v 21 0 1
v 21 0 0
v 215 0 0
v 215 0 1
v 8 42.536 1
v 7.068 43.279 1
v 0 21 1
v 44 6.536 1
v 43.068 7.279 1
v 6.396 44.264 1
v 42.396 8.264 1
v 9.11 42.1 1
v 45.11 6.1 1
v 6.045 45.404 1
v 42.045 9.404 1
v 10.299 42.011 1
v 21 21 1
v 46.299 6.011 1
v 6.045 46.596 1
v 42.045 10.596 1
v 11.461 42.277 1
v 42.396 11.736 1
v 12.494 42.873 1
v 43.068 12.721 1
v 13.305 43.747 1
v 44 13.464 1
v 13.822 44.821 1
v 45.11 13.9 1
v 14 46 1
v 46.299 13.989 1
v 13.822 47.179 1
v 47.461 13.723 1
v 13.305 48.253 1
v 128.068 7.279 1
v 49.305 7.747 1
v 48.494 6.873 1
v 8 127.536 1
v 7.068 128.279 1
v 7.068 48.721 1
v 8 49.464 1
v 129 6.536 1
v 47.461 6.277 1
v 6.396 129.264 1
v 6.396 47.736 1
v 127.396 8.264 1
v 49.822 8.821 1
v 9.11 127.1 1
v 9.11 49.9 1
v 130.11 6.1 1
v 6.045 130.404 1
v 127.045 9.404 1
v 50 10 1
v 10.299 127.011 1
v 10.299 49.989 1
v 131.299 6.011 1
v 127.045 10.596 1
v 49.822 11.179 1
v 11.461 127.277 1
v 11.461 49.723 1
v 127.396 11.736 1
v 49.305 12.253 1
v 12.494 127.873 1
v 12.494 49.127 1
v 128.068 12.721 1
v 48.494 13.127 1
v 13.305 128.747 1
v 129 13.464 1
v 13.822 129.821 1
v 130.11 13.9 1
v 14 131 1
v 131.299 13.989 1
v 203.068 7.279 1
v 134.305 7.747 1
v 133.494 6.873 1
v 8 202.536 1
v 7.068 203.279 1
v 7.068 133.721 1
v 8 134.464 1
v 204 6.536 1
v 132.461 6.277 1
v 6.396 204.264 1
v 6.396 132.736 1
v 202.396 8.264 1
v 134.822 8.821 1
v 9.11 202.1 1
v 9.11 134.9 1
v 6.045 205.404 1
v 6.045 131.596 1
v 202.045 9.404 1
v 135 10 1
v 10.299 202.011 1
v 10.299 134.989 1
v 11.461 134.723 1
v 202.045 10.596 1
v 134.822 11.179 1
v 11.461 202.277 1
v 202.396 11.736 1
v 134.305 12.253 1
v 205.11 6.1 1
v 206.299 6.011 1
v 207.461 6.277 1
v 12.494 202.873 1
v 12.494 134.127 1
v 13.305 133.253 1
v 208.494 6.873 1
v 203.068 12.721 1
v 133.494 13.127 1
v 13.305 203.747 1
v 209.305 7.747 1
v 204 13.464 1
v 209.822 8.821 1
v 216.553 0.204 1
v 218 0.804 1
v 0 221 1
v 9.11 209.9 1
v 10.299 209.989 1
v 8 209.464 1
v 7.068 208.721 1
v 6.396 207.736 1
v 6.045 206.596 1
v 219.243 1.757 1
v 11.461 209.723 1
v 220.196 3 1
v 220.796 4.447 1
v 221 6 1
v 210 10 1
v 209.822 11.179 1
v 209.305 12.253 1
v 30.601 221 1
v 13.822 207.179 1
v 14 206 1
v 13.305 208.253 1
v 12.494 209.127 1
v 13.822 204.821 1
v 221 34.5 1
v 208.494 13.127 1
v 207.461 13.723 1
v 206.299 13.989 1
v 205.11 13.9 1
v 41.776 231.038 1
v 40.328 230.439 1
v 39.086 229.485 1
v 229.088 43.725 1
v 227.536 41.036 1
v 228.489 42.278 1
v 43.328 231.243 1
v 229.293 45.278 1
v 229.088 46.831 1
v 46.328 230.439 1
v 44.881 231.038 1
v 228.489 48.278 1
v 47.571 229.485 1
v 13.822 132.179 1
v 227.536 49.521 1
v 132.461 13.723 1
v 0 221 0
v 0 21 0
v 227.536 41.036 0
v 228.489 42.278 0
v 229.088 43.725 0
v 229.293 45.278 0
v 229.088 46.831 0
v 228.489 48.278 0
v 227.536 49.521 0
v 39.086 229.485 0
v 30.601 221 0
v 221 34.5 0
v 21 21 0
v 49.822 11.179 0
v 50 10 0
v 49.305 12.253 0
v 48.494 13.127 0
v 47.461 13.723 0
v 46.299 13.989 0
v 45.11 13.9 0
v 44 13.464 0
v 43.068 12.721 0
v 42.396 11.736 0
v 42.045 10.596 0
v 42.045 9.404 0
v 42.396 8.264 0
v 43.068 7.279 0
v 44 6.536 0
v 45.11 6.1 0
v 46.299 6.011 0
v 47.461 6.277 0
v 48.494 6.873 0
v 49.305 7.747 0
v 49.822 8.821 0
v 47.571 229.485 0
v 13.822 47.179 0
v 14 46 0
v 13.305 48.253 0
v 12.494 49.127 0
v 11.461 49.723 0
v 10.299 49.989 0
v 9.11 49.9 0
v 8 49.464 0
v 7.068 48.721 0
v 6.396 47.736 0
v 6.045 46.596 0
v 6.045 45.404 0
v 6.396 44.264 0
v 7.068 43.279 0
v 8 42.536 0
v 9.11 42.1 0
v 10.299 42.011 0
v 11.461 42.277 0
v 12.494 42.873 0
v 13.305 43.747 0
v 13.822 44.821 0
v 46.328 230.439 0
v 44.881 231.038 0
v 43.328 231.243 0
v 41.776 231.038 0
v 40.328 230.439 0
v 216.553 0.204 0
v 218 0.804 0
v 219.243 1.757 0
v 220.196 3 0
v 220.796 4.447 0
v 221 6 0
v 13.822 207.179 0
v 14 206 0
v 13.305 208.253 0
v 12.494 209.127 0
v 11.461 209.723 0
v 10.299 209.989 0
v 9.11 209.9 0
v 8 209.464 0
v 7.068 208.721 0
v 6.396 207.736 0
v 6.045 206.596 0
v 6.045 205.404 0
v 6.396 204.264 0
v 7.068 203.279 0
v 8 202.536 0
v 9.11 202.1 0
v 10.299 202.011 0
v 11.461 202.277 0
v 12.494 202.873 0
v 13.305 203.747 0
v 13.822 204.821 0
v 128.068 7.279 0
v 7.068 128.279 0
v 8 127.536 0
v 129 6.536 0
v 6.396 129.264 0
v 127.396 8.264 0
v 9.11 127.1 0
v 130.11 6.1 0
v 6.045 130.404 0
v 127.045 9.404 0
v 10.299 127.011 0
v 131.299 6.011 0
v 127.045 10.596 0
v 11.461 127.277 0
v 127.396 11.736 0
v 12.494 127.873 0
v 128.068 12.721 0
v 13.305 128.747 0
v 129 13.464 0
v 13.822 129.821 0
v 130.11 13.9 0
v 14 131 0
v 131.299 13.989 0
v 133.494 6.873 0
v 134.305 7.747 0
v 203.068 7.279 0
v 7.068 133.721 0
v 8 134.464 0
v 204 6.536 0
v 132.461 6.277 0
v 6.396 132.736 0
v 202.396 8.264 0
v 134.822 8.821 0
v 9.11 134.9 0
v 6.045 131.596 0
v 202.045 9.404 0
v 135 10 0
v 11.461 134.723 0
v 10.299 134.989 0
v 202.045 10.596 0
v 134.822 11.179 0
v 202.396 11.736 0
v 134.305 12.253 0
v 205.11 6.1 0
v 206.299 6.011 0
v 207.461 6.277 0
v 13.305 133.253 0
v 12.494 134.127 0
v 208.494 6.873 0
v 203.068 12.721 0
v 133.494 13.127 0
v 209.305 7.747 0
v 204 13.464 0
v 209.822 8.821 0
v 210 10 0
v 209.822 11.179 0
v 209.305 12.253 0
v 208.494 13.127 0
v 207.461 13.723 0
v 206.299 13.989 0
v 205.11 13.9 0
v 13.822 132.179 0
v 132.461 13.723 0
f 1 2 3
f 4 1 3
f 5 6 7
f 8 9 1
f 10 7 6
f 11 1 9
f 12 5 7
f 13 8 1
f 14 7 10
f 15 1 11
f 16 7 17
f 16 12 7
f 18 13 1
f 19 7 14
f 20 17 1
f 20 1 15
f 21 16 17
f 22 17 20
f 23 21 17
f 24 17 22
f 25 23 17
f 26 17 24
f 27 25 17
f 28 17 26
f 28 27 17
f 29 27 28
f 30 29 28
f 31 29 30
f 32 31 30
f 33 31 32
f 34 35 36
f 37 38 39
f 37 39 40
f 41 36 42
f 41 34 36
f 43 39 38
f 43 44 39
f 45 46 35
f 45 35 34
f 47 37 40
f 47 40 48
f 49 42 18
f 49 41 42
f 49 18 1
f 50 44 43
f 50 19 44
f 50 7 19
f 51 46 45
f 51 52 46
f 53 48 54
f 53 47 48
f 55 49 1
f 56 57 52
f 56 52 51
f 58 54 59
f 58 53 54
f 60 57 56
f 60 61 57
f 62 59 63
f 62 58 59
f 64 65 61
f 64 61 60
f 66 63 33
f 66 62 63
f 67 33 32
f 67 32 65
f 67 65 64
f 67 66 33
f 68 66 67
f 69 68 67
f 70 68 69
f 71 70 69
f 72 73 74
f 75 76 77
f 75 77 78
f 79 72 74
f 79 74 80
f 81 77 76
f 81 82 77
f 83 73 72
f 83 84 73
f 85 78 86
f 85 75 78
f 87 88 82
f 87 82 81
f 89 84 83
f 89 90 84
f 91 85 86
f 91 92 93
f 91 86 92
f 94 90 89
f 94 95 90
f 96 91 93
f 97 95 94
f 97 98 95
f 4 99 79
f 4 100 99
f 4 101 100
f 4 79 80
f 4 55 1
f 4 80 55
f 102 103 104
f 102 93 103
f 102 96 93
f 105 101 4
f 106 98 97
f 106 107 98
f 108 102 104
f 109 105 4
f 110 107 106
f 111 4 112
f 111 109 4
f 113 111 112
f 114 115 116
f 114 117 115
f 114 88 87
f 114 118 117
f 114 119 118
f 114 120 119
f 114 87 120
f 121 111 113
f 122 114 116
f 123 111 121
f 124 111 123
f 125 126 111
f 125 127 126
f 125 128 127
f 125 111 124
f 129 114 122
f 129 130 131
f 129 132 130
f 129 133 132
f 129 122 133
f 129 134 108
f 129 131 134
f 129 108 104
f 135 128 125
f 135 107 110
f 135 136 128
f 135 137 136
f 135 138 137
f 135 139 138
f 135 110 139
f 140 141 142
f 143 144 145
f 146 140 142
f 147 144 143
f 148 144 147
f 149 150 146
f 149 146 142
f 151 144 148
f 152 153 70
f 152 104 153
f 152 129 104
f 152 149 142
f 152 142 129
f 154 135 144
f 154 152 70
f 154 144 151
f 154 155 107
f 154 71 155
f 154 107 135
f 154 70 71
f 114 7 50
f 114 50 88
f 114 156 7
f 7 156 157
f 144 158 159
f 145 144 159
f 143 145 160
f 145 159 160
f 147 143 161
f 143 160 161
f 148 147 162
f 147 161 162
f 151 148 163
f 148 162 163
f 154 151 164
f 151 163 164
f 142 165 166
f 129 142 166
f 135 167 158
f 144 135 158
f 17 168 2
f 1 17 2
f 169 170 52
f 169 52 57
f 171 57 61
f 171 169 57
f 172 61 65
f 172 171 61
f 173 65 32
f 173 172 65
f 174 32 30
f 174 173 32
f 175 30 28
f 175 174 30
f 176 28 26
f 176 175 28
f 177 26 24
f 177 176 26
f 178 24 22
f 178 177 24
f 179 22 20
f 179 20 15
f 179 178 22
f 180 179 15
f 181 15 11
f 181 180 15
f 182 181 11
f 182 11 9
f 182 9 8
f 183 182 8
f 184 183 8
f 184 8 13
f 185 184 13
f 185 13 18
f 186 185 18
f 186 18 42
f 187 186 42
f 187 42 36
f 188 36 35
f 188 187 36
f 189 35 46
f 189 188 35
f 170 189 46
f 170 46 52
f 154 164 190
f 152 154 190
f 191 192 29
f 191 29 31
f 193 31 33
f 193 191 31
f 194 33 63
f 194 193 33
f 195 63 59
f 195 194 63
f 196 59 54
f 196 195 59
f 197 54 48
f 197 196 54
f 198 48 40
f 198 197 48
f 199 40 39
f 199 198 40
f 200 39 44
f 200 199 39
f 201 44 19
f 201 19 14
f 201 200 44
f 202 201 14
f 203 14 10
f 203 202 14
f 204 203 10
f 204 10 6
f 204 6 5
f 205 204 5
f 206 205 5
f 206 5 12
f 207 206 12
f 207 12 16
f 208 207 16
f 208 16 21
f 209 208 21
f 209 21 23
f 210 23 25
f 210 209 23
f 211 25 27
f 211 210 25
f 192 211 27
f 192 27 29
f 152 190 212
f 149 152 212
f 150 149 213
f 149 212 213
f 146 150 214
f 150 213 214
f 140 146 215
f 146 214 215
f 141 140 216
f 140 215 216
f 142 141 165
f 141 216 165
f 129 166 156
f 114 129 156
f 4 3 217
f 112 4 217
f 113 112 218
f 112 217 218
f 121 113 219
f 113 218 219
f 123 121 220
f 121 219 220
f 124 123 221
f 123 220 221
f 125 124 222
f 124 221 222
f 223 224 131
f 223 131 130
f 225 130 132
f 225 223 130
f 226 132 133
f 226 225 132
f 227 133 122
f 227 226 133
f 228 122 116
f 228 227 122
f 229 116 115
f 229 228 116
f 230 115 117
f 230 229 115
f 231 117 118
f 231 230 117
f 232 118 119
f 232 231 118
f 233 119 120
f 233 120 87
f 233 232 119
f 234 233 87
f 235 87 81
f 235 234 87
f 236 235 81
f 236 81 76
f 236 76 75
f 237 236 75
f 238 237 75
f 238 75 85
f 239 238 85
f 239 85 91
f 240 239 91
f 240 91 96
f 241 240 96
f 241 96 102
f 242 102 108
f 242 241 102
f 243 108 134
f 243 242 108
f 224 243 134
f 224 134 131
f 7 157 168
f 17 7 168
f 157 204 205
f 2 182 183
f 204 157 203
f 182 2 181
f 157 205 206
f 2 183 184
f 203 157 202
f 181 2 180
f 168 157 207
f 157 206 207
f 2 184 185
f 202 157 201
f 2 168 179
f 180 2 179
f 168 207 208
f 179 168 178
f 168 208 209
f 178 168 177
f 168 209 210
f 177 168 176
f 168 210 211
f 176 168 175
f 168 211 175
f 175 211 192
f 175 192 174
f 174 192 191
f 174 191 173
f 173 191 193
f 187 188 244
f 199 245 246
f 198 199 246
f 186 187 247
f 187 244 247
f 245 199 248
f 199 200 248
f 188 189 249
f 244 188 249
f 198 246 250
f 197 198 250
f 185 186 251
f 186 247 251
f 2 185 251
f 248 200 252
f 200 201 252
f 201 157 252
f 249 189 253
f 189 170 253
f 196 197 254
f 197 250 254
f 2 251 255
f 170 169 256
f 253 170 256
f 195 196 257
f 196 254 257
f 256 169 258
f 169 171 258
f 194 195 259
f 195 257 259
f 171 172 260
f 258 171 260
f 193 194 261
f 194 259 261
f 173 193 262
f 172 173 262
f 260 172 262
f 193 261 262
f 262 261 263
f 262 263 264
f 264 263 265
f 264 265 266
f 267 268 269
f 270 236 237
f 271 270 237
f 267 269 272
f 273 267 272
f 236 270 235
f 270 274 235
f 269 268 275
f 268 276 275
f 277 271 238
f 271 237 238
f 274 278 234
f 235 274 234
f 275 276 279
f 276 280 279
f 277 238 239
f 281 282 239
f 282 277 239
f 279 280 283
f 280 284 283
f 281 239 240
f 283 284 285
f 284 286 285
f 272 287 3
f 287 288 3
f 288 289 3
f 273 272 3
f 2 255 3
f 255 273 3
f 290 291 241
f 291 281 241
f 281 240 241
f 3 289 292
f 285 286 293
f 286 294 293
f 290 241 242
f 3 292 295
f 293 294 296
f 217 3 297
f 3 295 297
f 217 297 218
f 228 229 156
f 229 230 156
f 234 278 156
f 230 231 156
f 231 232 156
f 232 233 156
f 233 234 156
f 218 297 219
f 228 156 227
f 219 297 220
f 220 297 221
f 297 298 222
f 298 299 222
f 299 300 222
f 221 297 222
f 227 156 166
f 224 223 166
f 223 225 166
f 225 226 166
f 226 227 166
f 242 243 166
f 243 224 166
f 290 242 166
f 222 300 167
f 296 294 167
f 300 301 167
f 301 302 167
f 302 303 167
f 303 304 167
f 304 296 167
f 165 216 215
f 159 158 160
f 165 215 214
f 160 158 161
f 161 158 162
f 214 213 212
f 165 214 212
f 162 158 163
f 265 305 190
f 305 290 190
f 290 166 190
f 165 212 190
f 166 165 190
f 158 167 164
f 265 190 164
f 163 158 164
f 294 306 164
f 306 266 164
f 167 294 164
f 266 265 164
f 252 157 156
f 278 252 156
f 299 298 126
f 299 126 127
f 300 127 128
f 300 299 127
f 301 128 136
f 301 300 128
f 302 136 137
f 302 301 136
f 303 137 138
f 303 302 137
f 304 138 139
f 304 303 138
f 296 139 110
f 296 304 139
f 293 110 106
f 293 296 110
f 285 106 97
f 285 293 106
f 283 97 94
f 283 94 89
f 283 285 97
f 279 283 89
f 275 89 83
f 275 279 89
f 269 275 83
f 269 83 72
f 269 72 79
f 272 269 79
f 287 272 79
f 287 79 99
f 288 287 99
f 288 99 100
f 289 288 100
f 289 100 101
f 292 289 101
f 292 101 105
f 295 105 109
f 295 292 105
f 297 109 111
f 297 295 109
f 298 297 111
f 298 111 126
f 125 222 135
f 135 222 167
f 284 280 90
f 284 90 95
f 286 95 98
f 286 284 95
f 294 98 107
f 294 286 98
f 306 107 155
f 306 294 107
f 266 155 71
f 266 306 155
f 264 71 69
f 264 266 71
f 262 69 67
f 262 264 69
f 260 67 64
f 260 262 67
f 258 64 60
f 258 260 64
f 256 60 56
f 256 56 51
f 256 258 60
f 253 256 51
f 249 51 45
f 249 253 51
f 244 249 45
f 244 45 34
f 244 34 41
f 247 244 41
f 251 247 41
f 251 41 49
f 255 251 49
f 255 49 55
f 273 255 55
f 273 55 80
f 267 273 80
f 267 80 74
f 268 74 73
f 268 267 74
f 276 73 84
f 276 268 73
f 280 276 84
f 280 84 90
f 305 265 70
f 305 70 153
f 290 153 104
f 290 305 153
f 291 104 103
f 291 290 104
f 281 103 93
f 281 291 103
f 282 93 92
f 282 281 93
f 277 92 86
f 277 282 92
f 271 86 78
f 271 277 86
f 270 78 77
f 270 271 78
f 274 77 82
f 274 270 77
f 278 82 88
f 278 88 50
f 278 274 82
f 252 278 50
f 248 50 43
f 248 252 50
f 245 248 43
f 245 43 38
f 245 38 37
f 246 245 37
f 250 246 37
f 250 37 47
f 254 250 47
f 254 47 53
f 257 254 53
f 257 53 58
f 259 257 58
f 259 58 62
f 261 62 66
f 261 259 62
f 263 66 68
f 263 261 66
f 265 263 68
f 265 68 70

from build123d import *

# Parameters (mm, degrees)
SKETCH_1_R      = 4
EXTRUDE_1_DEPTH = 1


with BuildPart() as part:
    # 草圖1 → 填料-伸長1 (new body)
    with BuildSketch(Plane.XY):
        with BuildLine():
            Line((0, 21), (21, 21))
            Line((21, 21), (21, 0))
            Line((21, 0), (215, 0))
            ThreePointArc((215, 0), (219.242640687, 1.757359313), (221, 6))
            Line((221, 6), (221, 34.5))
            Line((221, 34.5), (227.535533906, 41.035533906))
            ThreePointArc((227.535533906, 41.035533906), (229.292893219, 45.278174593), (227.535533906, 49.52081528))
            Line((227.535533906, 49.52081528), (47.571067812, 229.485281374))
            ThreePointArc((47.571067812, 229.485281374), (43.328427125, 231.242640687), (39.085786438, 229.485281374))
            Line((39.085786438, 229.485281374), (30.600505063, 221))
            Line((30.600505063, 221), (0, 221))
            Line((0, 221), (0, 21))
        make_face()
        with Locations((10, 206)):
            Circle(SKETCH_1_R, mode=Mode.SUBTRACT)
        with Locations((10, 46)):
            Circle(SKETCH_1_R, mode=Mode.SUBTRACT)
        with Locations((10, 131)):
            Circle(SKETCH_1_R, mode=Mode.SUBTRACT)
        with Locations((46, 10)):
            Circle(SKETCH_1_R, mode=Mode.SUBTRACT)
        with Locations((131, 10)):
            Circle(SKETCH_1_R, mode=Mode.SUBTRACT)
        with Locations((206, 10)):
            Circle(SKETCH_1_R, mode=Mode.SUBTRACT)
    extrude(amount=EXTRUDE_1_DEPTH)


solid = part.part
